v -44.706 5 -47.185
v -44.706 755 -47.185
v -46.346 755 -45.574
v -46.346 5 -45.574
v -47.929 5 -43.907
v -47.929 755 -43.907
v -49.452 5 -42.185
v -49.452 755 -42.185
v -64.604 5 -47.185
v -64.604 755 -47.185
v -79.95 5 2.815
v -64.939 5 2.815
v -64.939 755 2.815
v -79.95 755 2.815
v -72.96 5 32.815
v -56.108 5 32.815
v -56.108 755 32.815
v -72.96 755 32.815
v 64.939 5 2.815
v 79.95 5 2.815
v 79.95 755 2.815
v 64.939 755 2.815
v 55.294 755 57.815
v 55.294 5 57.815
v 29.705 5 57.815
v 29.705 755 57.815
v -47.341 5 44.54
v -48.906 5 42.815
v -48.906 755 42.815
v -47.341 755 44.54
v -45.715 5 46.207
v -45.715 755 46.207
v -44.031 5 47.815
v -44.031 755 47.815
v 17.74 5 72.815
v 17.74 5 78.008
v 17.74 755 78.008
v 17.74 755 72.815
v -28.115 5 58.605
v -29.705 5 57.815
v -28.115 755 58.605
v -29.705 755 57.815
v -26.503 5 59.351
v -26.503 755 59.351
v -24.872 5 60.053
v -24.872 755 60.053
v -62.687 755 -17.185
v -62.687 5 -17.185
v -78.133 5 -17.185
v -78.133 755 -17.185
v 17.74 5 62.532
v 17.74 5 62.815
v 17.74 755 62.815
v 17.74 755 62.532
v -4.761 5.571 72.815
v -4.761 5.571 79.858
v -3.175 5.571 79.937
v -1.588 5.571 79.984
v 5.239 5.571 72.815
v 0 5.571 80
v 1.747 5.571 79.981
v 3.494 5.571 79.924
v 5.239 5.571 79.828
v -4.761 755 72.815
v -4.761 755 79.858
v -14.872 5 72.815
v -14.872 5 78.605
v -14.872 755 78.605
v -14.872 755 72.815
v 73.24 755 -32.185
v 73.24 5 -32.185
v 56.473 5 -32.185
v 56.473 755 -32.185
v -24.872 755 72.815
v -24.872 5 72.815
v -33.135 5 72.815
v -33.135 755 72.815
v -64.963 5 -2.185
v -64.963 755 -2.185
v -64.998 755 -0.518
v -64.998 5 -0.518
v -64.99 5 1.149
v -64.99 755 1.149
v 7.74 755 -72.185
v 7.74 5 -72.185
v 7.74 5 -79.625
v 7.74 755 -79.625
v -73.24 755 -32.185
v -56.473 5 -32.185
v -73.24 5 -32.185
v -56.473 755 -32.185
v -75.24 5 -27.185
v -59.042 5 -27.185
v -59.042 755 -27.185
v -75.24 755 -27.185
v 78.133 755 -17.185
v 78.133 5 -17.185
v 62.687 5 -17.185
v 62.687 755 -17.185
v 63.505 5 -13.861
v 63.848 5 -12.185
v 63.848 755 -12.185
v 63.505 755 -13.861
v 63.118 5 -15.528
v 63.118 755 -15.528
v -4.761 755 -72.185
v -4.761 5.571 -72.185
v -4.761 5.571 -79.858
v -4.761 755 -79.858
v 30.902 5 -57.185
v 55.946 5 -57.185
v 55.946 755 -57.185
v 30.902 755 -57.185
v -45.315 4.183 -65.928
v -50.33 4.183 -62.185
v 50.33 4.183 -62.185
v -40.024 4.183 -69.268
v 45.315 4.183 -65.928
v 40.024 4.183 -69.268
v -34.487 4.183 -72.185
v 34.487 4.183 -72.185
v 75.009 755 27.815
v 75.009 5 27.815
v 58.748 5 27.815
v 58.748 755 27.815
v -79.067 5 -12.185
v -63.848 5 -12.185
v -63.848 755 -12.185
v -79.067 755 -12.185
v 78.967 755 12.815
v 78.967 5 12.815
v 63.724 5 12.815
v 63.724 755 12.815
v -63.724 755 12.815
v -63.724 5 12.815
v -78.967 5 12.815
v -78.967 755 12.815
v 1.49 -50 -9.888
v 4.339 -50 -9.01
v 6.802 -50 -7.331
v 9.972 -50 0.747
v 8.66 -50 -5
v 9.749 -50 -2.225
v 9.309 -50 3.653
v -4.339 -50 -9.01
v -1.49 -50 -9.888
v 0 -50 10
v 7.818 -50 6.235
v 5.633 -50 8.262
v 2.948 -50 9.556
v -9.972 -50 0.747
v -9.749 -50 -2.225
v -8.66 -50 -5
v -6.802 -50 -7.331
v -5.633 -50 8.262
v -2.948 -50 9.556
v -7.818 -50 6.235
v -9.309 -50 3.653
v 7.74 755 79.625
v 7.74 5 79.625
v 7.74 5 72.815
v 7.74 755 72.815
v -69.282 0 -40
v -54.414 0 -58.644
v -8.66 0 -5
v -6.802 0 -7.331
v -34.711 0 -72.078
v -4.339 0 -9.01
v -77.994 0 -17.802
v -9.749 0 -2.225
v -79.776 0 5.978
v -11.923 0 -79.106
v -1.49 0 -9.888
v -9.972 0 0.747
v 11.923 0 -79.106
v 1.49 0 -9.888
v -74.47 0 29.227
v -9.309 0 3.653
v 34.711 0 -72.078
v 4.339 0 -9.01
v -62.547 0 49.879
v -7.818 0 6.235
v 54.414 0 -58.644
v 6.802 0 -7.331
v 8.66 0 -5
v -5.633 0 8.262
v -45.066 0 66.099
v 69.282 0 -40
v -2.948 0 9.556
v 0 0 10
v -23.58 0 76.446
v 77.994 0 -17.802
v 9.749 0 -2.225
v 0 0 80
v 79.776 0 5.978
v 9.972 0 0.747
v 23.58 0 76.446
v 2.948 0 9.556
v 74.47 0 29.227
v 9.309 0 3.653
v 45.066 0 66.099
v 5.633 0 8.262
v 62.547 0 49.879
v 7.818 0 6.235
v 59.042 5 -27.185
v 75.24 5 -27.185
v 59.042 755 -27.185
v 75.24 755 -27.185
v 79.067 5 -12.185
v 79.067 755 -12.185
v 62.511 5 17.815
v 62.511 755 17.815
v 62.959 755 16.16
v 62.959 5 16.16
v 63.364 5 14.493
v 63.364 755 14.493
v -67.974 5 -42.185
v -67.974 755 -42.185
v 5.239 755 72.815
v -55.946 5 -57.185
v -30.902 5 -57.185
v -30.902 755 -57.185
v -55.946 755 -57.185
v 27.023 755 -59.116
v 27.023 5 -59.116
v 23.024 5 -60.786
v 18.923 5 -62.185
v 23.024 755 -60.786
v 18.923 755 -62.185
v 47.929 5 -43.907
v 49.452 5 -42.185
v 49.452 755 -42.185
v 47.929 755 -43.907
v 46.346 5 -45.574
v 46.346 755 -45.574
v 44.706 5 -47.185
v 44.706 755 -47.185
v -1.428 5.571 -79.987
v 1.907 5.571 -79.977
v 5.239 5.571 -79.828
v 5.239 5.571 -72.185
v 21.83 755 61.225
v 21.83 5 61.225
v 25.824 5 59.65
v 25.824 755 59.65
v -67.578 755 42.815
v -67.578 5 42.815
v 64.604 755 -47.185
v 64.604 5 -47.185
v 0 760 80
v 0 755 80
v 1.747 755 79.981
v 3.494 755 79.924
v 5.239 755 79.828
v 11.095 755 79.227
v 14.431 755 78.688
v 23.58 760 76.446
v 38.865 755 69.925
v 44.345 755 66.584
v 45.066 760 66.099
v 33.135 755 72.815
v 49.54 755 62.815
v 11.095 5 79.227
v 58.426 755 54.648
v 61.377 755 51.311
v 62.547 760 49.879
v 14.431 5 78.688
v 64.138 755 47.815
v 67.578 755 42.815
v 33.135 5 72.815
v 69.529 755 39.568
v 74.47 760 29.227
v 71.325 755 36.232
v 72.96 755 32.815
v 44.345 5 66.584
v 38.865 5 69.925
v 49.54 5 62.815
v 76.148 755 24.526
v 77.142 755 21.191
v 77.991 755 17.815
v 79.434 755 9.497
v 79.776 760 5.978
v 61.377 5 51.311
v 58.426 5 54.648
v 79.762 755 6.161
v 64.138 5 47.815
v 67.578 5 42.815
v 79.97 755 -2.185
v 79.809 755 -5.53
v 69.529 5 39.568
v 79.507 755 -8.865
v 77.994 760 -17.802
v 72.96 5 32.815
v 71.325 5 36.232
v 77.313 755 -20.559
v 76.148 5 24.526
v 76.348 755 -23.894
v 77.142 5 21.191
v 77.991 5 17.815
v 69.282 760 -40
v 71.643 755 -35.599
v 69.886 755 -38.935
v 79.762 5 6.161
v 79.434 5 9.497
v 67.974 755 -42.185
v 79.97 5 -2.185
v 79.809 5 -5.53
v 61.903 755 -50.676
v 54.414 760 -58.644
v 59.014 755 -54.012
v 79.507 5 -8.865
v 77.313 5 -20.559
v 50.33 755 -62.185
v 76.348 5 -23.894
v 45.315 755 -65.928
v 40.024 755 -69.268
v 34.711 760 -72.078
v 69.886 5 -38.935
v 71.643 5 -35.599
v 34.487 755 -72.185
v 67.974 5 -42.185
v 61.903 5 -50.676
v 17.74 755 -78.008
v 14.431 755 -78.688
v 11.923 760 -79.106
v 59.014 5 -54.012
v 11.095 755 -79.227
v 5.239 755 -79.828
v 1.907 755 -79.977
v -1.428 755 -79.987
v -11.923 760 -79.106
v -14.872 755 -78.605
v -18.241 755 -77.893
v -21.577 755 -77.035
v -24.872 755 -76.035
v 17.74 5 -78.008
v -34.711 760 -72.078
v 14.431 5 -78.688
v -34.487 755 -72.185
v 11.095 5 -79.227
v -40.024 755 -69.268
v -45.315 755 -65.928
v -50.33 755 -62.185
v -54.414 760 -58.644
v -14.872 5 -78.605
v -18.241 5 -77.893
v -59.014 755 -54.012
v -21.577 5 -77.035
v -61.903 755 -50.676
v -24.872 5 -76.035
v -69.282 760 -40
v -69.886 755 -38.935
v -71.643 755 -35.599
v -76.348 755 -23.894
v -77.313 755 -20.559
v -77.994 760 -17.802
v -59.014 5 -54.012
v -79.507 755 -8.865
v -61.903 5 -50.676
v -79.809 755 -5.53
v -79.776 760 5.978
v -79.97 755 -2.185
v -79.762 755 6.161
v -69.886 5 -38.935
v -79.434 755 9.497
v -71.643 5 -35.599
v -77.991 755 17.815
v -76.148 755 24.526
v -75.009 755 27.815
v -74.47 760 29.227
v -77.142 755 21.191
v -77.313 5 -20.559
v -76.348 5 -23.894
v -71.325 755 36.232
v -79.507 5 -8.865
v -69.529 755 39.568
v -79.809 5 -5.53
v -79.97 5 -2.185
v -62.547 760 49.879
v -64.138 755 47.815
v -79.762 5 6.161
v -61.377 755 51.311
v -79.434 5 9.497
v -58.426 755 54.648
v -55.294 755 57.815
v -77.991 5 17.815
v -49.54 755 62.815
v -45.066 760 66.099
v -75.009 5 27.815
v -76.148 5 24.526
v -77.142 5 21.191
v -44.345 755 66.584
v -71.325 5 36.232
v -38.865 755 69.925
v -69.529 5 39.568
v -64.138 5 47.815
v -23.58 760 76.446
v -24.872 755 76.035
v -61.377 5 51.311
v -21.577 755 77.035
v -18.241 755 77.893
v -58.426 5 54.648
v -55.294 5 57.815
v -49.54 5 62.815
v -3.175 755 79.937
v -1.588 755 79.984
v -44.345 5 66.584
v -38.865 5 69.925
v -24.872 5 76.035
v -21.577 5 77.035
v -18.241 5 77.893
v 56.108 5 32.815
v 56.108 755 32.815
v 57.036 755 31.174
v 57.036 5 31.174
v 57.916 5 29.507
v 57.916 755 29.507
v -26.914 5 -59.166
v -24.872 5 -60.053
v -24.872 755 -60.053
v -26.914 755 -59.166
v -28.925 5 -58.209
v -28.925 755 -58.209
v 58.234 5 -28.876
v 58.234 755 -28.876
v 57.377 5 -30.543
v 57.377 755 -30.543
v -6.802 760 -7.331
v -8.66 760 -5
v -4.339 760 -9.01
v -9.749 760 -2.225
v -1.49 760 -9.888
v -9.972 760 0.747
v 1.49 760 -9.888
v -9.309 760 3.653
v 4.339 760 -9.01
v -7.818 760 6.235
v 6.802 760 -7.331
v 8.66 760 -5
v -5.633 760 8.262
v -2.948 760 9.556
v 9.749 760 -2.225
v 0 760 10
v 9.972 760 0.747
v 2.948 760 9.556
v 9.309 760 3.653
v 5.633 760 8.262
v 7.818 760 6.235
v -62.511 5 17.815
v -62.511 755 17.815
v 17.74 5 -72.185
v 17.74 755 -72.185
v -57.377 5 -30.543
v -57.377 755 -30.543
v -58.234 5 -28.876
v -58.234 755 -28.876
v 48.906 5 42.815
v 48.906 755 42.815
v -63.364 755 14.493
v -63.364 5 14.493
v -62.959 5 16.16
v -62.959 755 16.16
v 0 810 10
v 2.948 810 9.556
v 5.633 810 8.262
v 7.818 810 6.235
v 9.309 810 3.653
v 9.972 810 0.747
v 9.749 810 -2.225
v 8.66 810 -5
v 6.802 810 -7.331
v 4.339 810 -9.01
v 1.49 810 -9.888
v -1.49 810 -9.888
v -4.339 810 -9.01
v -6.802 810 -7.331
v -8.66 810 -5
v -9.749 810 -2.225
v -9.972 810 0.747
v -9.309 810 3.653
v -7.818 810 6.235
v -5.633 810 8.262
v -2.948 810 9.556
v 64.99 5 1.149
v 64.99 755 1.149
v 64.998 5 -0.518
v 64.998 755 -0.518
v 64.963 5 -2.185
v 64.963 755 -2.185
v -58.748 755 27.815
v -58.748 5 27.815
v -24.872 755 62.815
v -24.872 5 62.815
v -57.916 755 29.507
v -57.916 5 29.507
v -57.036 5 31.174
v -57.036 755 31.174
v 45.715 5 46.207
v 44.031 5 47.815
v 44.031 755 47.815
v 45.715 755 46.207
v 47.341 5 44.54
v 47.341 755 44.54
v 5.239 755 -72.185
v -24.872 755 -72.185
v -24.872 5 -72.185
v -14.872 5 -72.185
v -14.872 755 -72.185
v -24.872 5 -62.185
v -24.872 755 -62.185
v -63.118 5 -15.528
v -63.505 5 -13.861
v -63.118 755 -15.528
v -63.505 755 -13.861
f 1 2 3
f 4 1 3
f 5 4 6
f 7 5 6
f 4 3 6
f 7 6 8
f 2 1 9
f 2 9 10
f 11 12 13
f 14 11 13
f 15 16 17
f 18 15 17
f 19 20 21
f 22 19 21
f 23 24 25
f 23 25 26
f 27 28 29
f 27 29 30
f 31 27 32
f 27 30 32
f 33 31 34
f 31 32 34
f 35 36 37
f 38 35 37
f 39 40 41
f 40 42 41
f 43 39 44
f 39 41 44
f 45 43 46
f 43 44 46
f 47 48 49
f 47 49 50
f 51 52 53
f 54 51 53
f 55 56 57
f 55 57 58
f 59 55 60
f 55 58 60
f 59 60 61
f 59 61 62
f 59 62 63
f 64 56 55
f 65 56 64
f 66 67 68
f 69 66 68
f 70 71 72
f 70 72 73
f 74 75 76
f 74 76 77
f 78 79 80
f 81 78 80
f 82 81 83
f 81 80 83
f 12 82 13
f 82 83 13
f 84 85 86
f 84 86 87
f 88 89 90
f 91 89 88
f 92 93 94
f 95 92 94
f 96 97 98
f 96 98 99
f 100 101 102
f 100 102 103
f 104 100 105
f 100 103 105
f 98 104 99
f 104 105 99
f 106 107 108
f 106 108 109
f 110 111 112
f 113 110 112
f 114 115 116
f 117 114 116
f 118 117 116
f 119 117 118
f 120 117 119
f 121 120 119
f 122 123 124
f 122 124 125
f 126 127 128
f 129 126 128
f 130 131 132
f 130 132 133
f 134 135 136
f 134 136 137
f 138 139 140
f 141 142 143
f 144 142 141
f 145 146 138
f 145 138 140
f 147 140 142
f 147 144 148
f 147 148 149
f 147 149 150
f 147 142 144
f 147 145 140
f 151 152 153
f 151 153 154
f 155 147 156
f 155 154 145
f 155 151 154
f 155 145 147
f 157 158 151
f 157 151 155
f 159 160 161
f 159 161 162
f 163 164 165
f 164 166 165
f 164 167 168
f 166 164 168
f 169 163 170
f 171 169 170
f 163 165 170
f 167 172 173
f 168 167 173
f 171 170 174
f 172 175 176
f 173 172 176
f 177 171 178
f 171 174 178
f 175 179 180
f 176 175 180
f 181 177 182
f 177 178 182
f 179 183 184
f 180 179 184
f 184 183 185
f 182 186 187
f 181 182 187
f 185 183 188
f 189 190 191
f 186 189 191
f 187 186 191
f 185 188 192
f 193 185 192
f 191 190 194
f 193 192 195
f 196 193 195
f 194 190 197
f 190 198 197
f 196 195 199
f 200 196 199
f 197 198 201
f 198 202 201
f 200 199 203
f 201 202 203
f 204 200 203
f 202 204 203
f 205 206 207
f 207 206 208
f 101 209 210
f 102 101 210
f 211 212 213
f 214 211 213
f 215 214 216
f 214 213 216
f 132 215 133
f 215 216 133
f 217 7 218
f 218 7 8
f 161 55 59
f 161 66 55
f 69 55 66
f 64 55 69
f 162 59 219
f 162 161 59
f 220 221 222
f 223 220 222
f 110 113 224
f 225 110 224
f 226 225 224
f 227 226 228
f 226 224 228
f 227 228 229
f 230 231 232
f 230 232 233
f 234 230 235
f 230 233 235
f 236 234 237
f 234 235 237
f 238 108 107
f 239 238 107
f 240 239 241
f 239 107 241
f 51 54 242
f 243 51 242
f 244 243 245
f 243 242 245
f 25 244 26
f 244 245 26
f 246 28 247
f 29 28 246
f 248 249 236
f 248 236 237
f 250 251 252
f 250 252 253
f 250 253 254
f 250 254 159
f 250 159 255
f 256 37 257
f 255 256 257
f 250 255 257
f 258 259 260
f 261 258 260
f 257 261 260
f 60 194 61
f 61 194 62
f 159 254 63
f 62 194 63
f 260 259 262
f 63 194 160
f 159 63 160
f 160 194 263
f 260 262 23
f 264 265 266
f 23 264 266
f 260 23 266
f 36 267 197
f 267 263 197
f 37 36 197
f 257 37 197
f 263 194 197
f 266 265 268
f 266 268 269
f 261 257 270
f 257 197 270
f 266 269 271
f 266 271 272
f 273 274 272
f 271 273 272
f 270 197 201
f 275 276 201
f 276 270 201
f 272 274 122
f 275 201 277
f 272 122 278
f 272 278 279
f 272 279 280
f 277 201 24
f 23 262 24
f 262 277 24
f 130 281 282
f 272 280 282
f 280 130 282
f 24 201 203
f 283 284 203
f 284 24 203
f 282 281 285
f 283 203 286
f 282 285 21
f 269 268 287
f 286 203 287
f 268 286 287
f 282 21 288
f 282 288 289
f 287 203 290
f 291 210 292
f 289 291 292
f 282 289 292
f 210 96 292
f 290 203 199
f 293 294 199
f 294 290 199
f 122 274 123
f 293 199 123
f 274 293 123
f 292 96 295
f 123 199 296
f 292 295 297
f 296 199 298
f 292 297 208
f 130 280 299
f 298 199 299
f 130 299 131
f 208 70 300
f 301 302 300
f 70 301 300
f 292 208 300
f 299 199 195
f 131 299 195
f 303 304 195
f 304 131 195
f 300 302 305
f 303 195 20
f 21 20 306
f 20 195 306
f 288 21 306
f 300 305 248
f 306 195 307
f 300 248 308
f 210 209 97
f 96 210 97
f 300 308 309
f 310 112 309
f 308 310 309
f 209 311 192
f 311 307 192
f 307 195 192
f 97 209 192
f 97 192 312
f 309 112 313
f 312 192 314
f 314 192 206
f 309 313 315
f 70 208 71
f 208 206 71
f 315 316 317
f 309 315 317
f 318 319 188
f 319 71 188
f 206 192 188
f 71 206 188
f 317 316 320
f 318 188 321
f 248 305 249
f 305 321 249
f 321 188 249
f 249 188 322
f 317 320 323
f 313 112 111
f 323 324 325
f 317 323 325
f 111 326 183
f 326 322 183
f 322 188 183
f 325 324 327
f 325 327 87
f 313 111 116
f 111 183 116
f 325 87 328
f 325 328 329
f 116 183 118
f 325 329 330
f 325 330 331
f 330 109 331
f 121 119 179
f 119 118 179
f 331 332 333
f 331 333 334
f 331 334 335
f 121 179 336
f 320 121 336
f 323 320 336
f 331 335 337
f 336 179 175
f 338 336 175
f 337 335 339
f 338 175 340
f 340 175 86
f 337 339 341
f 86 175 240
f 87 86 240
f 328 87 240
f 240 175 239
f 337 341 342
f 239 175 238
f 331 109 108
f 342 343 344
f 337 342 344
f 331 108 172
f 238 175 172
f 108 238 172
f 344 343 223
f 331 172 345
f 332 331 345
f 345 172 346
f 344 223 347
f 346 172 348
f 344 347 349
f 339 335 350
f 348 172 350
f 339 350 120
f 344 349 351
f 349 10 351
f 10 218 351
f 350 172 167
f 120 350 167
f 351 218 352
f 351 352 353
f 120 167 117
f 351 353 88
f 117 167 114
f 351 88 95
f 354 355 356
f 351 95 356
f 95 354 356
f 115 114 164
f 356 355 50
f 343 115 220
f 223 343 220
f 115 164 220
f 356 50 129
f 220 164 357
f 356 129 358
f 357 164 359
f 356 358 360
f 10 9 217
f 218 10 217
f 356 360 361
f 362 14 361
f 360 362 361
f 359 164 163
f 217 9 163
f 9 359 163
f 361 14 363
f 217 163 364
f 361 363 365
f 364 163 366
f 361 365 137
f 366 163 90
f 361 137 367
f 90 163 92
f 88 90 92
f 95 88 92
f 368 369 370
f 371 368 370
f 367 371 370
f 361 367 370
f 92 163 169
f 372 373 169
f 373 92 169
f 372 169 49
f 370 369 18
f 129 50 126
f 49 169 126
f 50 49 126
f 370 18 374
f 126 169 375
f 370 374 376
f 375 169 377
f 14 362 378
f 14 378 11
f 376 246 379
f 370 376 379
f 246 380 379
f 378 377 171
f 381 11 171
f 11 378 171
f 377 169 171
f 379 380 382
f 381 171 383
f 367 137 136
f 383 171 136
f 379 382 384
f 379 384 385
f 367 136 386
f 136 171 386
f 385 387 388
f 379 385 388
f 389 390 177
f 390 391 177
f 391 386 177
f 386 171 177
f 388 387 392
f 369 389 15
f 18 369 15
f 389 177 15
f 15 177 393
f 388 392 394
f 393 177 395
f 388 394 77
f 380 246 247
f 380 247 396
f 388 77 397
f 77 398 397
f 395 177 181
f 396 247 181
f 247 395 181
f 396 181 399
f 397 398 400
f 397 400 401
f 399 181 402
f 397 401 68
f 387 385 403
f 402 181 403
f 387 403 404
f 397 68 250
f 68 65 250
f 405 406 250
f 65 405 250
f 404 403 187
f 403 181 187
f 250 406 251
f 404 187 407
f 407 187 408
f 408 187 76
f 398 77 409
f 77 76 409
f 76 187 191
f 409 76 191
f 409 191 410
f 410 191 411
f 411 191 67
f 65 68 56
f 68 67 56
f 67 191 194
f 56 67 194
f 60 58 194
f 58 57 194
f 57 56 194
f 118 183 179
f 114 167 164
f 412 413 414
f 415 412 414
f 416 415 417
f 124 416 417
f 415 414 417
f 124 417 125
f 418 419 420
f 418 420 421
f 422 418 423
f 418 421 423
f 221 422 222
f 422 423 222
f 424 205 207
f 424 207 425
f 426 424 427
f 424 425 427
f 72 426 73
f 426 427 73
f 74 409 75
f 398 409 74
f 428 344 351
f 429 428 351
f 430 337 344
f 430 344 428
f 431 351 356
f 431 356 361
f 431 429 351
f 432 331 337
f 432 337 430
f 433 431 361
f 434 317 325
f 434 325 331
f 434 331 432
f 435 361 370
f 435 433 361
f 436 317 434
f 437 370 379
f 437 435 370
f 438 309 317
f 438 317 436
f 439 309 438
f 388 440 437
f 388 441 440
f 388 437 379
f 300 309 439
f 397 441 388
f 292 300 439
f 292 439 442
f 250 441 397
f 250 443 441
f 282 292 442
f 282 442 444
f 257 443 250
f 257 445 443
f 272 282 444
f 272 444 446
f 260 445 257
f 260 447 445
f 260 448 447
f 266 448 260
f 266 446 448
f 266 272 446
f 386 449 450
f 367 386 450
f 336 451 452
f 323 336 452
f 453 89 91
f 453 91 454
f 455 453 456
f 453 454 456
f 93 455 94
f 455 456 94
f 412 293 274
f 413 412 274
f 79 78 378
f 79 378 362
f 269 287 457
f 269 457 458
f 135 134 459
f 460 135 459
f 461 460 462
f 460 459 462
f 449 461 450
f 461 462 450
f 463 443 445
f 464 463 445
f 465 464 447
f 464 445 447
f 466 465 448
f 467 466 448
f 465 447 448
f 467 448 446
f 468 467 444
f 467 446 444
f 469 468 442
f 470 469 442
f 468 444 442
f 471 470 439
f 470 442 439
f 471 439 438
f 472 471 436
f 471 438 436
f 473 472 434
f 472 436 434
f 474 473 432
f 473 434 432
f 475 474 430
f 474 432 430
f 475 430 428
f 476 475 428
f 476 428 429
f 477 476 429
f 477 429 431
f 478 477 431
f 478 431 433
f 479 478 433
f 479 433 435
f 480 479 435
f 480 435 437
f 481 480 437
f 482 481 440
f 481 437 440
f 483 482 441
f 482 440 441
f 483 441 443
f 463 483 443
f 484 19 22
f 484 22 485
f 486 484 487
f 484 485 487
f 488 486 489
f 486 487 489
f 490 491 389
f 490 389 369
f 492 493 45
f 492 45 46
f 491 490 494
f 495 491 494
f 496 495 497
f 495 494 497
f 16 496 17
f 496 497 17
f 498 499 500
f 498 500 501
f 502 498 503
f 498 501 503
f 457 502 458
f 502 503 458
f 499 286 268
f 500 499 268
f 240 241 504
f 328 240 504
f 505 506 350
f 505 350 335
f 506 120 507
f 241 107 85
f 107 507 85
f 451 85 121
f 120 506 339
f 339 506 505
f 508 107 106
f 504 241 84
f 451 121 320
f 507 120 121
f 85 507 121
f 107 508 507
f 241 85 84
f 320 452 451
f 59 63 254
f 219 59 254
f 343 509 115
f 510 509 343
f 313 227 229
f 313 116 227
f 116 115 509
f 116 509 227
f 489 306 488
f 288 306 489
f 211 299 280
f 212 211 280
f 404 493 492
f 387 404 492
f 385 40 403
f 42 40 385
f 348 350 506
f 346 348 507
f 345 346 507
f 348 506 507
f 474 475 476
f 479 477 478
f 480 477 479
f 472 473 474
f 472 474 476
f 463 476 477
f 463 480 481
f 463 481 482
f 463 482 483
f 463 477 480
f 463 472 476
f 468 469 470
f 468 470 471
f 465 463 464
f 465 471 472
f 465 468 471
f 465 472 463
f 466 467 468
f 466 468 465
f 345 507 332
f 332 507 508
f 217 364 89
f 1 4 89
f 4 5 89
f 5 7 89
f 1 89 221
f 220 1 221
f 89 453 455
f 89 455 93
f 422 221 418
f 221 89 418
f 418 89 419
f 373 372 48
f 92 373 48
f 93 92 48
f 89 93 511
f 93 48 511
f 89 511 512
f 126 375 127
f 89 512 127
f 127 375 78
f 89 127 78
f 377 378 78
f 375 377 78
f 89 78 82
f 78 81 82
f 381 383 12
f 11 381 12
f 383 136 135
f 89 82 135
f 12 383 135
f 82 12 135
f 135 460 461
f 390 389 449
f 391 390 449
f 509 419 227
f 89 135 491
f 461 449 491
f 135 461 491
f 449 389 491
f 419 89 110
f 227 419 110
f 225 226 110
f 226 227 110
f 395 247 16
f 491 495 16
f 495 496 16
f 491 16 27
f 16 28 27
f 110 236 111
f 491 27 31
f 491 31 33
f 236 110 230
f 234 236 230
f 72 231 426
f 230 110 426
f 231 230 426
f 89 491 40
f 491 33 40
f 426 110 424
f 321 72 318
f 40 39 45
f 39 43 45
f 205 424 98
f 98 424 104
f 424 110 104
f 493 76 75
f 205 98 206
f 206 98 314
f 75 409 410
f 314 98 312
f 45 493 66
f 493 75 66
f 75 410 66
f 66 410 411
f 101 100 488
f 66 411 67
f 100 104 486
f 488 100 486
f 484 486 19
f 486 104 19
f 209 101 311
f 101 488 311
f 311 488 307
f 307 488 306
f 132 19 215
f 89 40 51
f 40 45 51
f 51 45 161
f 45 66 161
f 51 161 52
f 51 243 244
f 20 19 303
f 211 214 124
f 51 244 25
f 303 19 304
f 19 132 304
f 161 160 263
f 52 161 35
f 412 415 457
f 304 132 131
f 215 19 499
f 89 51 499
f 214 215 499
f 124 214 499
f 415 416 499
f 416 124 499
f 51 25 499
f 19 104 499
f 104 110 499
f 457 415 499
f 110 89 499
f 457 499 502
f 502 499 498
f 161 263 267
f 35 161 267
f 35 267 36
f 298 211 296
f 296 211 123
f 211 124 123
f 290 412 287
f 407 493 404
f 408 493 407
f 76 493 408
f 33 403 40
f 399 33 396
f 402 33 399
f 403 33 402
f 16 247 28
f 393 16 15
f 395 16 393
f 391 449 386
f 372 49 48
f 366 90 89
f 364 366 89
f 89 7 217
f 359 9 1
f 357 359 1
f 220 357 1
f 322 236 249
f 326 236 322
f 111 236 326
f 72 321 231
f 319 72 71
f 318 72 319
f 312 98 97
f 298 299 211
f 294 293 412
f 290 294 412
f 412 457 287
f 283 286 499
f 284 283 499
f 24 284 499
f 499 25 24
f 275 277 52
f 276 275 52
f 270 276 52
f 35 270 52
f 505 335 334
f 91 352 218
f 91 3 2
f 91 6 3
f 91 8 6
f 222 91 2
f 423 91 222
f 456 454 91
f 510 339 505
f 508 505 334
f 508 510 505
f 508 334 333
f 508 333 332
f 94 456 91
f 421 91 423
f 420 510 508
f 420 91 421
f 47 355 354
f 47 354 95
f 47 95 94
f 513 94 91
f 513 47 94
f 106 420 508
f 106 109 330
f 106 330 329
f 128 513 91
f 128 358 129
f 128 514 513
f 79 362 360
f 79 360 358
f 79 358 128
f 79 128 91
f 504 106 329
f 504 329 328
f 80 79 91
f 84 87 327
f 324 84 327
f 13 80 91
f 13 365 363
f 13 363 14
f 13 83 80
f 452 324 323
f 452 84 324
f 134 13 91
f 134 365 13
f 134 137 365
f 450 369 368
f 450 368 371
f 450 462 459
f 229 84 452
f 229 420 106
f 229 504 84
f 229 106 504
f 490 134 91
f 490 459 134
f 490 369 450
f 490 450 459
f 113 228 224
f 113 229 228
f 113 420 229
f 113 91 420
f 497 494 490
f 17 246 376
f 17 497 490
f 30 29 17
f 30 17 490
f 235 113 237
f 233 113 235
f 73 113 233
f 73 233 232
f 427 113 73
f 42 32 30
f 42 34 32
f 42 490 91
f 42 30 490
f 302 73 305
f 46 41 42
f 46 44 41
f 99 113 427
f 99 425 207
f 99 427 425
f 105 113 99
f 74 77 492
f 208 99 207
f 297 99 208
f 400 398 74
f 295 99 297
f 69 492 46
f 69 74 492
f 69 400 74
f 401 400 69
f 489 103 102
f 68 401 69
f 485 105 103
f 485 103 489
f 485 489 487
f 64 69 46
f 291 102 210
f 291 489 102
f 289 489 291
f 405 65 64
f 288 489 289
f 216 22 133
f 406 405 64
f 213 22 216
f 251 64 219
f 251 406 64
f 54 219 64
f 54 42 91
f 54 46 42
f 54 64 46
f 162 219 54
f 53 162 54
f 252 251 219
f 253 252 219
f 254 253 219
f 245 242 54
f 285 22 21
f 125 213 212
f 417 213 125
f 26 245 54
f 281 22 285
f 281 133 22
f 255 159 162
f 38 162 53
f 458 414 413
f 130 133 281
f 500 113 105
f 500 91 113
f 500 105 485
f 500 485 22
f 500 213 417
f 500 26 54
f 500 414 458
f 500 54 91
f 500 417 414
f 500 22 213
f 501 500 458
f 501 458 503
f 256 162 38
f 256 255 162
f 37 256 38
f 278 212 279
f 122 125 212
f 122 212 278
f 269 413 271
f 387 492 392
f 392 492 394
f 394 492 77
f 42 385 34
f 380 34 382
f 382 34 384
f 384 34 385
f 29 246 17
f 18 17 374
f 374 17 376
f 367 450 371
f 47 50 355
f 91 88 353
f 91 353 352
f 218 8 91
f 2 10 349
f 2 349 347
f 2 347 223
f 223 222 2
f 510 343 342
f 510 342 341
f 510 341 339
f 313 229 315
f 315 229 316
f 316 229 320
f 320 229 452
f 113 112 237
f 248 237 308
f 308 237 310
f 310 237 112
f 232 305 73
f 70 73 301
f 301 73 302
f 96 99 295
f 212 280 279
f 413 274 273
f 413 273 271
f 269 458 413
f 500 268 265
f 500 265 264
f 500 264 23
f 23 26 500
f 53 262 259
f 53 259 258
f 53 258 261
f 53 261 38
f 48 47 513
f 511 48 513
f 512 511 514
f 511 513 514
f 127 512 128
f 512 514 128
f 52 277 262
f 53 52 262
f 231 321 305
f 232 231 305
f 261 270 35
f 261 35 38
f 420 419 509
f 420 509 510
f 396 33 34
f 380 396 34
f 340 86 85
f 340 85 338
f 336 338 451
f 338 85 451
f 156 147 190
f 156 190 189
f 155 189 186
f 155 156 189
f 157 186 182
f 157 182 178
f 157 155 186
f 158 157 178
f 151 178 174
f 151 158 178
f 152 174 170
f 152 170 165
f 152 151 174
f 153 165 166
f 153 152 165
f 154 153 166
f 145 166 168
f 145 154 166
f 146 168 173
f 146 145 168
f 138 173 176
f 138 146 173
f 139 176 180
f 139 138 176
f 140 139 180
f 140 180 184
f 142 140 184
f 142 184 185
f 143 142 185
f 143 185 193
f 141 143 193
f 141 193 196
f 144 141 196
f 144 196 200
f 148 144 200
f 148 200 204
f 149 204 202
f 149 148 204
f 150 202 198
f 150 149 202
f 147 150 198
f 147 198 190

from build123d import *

# Parameters (mm, degrees)
SKETCH_1_R          = 80
EXTRUDE_1_DEPTH     = 760
CUT_EXTRUDE_START   = -5
SKETCH_2_R          = 65
CUT_EXTRUDE_1_DEPTH = 750
SKETCH_4_W          = 10
SKETCH_4_H          = 750
SKETCH_4_H_2        = 750.817396449
CUT_EXTRUDE_5_DEPTH = 781.768851838
SKETCH_5_W          = 10
SKETCH_5_H          = 750
SKETCH_5_H_2        = 749.429411824
CUT_EXTRUDE_6_DEPTH = 1100
SKETCH_6_R          = 10
EXTRUDE_2_DEPTH     = 50
EXTRUDE_START       = 50
SKETCH_7_R          = 10
EXTRUDE_3_DEPTH     = 50


with BuildPart() as part:
    # 草图1 → 凸台-拉伸1 (new body)
    with BuildSketch(Plane(origin=(0, 0, 0), x_dir=(1, 0, 0), z_dir=(0, 1, 0))):
        with Locations(Location((0, 0, 0), (0, 0, 270))):
            Circle(SKETCH_1_R)
    extrude(amount=EXTRUDE_1_DEPTH)

    # 草图2 → 切除-拉伸1 (cut)
    with BuildSketch(Plane(origin=(0, 760, 0), x_dir=(1, 0, 0), z_dir=(0, 1, 0)).offset(CUT_EXTRUDE_START)):
        with Locations(Location((0, 0, 0), (0, 0, 270))):
            Circle(SKETCH_2_R)
    extrude(amount=-CUT_EXTRUDE_1_DEPTH, mode=Mode.SUBTRACT)

    # 草图4 → 切除-拉伸5 (cut, through all)
    with BuildSketch(Plane(origin=(80, 0, 0), x_dir=(0, 0, -1), z_dir=(1, 0, 0))):
        with Locations((-67.815389673, 380)):
            Rectangle(SKETCH_4_W, SKETCH_4_H)
        with Locations((-52.815389673, 380)):
            Rectangle(SKETCH_4_W, SKETCH_4_H)
        with Locations((-37.815389673, 380)):
            Rectangle(SKETCH_4_W, SKETCH_4_H)
        with Locations((-7.815389673, 380)):
            Rectangle(SKETCH_4_W, SKETCH_4_H)
        with Locations((22.184610327, 380)):
            Rectangle(SKETCH_4_W, SKETCH_4_H)
        with Locations((52.184610327, 380)):
            Rectangle(SKETCH_4_W, SKETCH_4_H)
        with Locations((7.184610327, 380)):
            Rectangle(SKETCH_4_W, SKETCH_4_H)
        with Locations((37.184610327, 380)):
            Rectangle(SKETCH_4_W, SKETCH_4_H)
        with Locations((-22.815389673, 380)):
            Rectangle(SKETCH_4_W, SKETCH_4_H)
        with Locations((67.184610327, 379.591301776)):
            Rectangle(SKETCH_4_W, SKETCH_4_H_2)
    extrude(amount=-CUT_EXTRUDE_5_DEPTH, mode=Mode.SUBTRACT)

    # 草图5 → 切除-拉伸6 (cut)
    with BuildSketch(Plane.XY.offset(192.352939281)):
        with Locations((-19.871967952, 380)):
            Rectangle(SKETCH_5_W, SKETCH_5_H)
        with Locations((0.239093499, 380.285294088)):
            Rectangle(SKETCH_5_W, SKETCH_5_H_2)
        with Locations((12.740250466, 380)):
            Rectangle(SKETCH_5_W, SKETCH_5_H)
    extrude(amount=-CUT_EXTRUDE_6_DEPTH, mode=Mode.SUBTRACT)

    # 草图6 → 凸台-拉伸2 (add)
    with BuildSketch(Plane(origin=(0, 760, 0), x_dir=(1, 0, 0), z_dir=(0, 1, 0))):
        with Locations(Location((0, 0, 0), (0, 0, 270))):
            Circle(SKETCH_6_R)
    extrude(amount=EXTRUDE_2_DEPTH)

    # 草图7 → 凸台-拉伸3 (add)
    with BuildSketch(Plane.XZ.offset(EXTRUDE_START)):
        with Locations(Location((0, 0, 0), (0, 0, 90))):
            Circle(SKETCH_7_R)
    extrude(amount=-EXTRUDE_3_DEPTH)


solid = part.part
